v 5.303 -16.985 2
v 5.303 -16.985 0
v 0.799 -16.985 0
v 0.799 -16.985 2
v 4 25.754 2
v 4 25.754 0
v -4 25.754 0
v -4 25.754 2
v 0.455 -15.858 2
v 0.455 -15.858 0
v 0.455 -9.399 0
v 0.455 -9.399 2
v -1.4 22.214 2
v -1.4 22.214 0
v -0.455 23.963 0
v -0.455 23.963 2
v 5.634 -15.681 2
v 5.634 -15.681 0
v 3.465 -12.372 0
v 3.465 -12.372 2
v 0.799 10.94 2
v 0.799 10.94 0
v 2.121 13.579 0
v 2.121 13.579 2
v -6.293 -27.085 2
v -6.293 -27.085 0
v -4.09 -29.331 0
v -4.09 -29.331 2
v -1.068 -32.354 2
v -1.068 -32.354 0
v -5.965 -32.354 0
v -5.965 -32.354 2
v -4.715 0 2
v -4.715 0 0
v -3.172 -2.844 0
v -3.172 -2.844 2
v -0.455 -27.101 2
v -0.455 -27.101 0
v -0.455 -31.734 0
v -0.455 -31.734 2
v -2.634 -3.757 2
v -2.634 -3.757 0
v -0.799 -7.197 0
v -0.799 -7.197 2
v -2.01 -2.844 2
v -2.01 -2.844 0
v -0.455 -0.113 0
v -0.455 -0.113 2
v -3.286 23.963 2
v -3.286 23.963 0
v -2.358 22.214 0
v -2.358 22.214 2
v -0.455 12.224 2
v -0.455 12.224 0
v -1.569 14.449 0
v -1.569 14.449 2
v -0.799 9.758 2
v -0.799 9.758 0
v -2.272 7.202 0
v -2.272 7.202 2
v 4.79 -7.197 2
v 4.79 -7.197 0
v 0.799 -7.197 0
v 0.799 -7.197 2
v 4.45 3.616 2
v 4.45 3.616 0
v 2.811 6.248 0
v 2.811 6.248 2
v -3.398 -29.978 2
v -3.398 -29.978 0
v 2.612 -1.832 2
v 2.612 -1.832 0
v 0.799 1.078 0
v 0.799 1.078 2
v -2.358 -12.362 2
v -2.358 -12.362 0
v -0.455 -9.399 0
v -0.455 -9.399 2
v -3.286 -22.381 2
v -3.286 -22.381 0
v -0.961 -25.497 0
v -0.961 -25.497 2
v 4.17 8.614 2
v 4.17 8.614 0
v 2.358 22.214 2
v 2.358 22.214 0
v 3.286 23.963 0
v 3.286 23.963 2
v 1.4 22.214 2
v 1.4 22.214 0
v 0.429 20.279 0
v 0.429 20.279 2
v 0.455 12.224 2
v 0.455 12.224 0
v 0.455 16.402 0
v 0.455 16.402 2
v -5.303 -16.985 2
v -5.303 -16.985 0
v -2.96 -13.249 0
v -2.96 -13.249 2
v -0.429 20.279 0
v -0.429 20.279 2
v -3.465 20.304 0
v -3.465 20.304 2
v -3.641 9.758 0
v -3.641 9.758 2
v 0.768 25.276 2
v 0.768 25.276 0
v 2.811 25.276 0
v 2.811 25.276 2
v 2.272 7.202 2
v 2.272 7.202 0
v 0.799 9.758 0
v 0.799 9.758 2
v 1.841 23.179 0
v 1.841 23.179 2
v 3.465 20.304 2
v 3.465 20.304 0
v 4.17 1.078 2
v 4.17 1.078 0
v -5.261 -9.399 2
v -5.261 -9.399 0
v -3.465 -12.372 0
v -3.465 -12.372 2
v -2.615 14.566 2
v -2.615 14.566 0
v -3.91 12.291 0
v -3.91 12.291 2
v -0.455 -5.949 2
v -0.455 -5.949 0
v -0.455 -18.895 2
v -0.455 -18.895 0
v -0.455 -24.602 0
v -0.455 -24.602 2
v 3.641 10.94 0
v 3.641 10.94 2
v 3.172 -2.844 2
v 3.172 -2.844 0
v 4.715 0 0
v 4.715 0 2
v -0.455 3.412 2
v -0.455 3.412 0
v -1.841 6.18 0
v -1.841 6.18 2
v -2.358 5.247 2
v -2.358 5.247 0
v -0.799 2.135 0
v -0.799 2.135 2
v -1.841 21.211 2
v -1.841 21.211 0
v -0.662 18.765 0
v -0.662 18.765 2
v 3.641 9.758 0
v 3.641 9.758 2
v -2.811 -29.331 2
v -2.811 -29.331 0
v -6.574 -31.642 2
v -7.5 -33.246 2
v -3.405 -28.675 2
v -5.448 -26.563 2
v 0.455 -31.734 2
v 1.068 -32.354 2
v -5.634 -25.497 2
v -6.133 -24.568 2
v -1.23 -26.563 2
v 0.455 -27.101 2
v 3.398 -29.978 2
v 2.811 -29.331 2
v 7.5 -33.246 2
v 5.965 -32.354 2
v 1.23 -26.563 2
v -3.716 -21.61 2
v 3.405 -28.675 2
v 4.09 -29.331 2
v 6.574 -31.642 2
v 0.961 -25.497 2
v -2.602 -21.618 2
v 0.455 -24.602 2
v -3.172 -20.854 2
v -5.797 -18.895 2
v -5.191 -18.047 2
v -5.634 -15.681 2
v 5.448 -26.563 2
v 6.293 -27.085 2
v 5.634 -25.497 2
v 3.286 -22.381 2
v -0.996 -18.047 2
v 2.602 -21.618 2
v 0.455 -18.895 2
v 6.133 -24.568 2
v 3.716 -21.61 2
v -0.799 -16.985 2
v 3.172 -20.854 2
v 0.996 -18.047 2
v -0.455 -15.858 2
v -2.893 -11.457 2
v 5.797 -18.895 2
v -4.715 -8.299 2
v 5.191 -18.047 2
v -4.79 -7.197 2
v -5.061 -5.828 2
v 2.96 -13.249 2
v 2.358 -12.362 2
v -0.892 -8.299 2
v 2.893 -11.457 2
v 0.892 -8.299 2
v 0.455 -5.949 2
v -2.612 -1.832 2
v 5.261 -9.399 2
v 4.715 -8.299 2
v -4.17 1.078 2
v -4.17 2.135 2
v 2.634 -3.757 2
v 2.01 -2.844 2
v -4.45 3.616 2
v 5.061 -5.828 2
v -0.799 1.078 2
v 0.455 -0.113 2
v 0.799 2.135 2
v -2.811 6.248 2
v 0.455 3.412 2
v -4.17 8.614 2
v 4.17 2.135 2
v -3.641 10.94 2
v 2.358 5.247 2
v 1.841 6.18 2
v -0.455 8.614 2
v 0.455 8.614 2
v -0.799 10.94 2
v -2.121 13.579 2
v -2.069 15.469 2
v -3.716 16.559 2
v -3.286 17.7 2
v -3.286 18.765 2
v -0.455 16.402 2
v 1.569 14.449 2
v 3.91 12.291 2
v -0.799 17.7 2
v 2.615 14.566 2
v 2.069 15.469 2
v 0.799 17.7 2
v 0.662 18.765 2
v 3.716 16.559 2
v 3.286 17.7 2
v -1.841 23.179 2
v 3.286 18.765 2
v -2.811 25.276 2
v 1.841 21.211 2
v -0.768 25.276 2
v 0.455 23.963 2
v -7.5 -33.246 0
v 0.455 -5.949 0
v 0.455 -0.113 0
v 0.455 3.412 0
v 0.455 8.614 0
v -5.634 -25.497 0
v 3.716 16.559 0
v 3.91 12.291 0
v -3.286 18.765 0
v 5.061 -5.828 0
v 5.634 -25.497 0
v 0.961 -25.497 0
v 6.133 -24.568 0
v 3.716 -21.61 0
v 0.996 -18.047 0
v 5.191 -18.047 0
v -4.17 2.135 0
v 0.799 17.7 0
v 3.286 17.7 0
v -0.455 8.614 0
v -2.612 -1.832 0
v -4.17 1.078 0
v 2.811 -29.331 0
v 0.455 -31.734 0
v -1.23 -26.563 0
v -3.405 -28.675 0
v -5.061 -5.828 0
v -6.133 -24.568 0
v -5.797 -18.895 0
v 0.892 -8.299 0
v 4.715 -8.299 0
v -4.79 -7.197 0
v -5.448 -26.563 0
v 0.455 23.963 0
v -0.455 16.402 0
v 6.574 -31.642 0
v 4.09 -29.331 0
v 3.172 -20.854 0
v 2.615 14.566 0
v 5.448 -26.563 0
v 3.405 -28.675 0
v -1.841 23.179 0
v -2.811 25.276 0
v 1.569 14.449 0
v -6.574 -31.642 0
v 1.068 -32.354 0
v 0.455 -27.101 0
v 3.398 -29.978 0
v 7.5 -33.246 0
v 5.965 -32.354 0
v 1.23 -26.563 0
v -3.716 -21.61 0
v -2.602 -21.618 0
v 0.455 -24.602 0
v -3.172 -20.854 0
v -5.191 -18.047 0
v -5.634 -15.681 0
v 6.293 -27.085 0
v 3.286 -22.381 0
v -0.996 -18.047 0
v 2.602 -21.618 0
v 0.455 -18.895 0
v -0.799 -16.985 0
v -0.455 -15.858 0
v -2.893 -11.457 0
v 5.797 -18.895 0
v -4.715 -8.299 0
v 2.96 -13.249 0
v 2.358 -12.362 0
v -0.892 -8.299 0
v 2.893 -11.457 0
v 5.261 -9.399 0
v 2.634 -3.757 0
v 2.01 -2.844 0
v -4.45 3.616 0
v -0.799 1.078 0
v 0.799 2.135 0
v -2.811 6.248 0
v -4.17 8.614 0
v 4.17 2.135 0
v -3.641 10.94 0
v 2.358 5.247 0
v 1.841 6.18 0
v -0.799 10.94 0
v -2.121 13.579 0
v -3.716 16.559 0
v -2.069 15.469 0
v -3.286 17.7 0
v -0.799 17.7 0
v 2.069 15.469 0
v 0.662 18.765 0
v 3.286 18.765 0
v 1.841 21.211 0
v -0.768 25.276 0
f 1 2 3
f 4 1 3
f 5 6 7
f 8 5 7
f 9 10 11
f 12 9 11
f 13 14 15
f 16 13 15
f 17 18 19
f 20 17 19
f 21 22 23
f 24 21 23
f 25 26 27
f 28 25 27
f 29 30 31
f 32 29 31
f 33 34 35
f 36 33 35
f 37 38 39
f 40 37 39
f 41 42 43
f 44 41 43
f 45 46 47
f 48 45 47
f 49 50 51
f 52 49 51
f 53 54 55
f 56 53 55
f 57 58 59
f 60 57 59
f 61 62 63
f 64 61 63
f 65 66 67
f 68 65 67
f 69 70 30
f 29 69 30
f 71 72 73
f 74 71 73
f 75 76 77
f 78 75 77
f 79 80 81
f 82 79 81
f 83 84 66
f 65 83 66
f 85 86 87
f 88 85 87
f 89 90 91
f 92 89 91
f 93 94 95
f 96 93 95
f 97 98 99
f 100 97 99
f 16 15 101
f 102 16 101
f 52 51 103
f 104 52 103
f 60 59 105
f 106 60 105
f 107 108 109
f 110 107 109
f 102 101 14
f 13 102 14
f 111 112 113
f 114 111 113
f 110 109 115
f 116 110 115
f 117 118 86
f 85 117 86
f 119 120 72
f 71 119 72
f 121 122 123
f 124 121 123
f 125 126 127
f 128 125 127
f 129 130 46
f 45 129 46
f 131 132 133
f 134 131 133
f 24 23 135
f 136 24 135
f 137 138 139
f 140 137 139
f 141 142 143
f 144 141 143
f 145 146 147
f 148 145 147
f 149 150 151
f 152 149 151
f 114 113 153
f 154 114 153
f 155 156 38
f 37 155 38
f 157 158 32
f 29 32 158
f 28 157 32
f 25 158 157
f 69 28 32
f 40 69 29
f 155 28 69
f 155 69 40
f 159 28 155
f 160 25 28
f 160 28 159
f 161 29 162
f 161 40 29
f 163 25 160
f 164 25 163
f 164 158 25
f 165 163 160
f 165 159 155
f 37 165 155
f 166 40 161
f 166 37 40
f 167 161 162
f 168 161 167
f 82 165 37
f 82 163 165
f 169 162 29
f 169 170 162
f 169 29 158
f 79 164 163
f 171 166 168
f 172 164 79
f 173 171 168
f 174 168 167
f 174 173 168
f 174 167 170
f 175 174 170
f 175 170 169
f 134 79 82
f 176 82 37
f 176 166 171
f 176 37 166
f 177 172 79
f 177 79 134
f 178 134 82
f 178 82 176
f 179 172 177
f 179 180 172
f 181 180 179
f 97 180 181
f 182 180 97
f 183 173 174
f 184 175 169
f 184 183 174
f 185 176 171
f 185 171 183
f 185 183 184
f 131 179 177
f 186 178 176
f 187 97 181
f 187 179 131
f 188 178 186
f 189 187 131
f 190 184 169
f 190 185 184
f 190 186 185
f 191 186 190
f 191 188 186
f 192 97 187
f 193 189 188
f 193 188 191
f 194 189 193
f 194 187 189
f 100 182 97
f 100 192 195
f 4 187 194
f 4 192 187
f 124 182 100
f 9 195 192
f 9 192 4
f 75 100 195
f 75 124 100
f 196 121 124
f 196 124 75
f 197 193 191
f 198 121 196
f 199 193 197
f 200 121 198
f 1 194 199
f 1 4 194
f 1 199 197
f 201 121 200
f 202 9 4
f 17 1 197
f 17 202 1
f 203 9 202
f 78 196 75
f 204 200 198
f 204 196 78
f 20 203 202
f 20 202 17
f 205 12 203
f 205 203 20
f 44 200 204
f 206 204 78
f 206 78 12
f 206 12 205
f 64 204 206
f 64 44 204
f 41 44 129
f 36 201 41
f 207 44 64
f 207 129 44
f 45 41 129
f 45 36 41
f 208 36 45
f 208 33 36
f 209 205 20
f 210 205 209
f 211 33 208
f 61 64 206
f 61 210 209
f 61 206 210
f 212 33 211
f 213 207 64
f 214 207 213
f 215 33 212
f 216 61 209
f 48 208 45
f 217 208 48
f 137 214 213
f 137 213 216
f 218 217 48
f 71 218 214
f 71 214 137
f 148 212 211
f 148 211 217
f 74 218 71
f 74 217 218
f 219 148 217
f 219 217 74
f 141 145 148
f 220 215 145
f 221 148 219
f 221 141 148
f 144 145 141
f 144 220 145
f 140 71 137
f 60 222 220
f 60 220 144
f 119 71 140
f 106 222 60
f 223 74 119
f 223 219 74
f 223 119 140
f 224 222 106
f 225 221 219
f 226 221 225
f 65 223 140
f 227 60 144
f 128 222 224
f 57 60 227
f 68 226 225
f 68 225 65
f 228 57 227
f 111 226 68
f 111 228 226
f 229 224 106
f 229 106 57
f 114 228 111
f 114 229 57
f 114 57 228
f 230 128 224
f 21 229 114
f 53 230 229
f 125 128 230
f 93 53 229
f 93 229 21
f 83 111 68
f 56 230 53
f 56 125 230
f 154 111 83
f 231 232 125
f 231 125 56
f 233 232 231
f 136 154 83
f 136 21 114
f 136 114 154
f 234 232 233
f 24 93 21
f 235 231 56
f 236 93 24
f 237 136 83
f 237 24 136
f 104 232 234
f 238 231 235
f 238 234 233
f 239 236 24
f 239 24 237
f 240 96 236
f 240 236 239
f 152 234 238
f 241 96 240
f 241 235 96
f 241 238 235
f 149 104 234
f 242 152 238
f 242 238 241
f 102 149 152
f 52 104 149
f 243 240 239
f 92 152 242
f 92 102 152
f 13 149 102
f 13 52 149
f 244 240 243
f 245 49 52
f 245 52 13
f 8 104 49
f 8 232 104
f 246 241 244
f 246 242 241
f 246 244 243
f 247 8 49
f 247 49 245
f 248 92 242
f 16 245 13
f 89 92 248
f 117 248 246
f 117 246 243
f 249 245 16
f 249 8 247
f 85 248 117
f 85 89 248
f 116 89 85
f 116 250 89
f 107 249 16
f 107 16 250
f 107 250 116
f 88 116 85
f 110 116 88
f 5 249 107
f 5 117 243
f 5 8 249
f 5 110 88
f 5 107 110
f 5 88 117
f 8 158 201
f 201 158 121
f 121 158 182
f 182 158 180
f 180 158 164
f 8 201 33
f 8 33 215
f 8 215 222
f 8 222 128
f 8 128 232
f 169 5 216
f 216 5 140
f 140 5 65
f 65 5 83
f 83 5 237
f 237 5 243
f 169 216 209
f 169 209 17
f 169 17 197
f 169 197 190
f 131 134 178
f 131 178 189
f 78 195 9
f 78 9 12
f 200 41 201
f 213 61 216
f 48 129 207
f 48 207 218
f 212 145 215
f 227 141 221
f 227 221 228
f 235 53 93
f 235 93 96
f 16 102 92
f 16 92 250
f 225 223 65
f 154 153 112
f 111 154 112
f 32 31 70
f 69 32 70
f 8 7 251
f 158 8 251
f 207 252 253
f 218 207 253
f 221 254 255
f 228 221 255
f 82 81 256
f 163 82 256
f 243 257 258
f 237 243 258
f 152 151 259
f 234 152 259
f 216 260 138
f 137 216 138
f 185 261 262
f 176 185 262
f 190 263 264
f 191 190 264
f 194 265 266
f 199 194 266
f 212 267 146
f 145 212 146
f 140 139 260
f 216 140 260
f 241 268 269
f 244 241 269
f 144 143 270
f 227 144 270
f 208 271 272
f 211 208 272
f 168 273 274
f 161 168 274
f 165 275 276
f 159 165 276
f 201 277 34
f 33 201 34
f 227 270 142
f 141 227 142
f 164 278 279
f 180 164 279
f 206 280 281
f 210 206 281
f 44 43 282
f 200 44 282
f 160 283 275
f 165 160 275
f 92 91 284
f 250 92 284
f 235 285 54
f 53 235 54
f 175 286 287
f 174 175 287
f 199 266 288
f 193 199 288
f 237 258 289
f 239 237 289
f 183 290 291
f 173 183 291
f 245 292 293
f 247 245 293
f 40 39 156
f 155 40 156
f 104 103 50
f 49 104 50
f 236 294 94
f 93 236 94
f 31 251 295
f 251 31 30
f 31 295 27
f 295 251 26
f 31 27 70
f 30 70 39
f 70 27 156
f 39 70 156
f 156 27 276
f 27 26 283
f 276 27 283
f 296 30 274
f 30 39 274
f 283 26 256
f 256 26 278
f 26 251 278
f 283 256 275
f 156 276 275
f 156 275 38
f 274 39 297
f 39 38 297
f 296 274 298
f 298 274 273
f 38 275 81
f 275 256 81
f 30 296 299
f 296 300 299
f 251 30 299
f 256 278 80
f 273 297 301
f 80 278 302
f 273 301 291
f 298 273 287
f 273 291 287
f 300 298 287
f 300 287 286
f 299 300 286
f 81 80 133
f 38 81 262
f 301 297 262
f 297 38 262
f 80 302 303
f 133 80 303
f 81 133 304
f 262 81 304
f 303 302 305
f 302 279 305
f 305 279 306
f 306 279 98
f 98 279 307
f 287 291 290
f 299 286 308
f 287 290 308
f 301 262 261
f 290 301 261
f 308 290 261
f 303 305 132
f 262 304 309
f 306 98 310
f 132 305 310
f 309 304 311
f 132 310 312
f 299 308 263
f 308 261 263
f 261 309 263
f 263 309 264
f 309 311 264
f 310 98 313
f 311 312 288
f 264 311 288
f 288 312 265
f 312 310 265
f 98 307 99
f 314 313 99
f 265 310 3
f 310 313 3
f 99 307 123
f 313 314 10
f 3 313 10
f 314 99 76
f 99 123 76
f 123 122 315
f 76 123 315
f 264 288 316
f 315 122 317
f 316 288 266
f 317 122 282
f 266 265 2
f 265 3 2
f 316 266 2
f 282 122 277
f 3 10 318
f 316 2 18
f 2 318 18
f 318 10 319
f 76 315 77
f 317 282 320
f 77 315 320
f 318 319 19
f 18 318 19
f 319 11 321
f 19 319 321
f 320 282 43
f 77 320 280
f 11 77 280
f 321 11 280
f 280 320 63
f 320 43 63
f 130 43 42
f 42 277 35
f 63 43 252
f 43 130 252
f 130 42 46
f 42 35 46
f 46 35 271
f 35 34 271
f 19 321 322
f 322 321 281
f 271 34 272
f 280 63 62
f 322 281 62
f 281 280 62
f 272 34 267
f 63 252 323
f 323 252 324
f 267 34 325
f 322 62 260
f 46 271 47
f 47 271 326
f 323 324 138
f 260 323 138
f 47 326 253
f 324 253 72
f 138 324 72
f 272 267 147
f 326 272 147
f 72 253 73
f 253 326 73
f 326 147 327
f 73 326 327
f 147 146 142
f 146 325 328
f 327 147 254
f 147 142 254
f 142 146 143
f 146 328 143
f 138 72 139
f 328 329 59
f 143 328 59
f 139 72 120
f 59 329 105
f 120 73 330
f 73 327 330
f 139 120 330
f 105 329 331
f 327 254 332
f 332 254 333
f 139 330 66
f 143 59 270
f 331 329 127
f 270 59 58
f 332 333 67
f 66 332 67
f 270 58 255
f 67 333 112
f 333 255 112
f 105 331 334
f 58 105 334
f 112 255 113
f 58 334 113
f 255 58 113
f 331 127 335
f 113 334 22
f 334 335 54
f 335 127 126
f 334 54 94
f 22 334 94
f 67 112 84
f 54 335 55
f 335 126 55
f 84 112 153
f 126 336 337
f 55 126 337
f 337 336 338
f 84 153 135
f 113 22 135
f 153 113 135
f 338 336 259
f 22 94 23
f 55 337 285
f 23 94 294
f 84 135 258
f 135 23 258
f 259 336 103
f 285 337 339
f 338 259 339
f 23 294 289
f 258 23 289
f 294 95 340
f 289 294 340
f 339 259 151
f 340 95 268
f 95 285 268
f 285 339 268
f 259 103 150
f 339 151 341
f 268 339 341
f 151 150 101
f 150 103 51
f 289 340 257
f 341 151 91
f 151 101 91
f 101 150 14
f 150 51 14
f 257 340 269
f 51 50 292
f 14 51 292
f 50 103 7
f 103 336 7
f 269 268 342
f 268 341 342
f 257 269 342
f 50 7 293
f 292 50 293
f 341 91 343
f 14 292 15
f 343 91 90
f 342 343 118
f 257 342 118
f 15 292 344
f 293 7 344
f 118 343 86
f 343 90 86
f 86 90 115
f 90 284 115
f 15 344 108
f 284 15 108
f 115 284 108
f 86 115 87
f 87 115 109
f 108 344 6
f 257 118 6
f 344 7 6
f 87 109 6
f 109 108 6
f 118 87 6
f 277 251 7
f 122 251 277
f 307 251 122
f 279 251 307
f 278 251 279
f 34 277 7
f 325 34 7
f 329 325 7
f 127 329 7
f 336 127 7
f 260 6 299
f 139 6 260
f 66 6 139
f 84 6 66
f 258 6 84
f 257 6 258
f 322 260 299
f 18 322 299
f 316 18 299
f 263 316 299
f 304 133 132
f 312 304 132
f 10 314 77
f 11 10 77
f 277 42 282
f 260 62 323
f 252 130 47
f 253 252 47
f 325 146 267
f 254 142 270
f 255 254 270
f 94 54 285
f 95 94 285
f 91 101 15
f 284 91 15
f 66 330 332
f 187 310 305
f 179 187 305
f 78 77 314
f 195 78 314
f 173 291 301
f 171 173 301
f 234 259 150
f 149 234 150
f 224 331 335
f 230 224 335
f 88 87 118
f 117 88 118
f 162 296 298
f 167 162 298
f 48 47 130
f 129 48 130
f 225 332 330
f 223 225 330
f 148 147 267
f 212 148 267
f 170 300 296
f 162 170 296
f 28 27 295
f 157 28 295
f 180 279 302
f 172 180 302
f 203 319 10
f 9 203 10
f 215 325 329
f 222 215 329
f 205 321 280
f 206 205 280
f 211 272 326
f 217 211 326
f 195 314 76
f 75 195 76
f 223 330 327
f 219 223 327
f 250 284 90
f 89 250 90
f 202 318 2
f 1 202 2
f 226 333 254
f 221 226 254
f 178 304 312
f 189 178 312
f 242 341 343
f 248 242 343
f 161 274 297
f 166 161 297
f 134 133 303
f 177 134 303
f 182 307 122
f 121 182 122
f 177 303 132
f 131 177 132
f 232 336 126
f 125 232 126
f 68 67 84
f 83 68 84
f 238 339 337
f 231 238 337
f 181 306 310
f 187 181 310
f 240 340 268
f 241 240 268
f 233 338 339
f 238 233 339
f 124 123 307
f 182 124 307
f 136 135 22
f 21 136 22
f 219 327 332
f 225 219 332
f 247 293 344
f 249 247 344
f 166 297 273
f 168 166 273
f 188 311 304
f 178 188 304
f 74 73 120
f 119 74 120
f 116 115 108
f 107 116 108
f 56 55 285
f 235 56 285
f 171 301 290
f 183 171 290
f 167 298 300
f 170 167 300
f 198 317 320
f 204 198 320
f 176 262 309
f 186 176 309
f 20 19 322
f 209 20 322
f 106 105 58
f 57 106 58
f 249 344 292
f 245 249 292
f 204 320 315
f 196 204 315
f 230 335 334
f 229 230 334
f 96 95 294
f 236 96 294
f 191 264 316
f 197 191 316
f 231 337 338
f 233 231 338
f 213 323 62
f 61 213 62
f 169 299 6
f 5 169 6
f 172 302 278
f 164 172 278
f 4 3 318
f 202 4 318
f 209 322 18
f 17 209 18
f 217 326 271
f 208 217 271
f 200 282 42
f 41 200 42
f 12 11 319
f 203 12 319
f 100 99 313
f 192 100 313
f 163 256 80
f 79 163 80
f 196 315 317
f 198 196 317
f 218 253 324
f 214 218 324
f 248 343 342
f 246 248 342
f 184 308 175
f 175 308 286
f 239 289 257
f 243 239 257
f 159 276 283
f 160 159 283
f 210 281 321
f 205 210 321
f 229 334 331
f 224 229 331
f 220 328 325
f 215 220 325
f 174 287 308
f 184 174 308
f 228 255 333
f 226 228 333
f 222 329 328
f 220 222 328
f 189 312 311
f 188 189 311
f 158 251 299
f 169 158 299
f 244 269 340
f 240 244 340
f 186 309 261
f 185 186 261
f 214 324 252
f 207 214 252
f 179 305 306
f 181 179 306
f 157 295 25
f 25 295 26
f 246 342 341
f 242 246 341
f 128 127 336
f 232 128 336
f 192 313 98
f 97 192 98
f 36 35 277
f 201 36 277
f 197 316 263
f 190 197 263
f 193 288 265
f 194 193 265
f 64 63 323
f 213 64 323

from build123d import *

# Parameters (mm, degrees)
F1_DEPTH = 2


with BuildPart() as f1:
    # F0 (on Top) → F1 (new body)
    with BuildSketch(Plane.XY):
        Polygon((4, 25.754048), (0, 25.754048), (-4, 25.754048), (-7.5, -33.245952), (0, -33.245952), (7.5, -33.245952), align=None)
        Polygon((-4.089832, -29.330796), (-6.573987, -31.641873), (-6.292557, -27.084958), align=None, mode=Mode.SUBTRACT)
        Polygon((-6.13311, -24.568204), (-5.796553, -18.894804), (-3.715754, -21.609863), align=None, mode=Mode.SUBTRACT)
        Polygon((-1.067552, -32.354102), (-5.965223, -32.354102), (-3.397664, -29.978383), align=None, mode=Mode.SUBTRACT)
        Polygon((-3.404538, -28.675417), (-5.447618, -26.563399), (-1.229849, -26.563399), align=None, mode=Mode.SUBTRACT)
        Polygon((-0.45485, -31.733501), (-2.811431, -29.330796), (-0.45485, -27.101166), align=None, mode=Mode.SUBTRACT)
        Polygon((-5.633629, -25.496741), (-3.286195, -22.381087), (-0.96125, -25.496741), align=None, mode=Mode.SUBTRACT)
        Polygon((-3.17182, -20.85387), (-5.191417, -18.046699), (-0.996083, -18.046699), align=None, mode=Mode.SUBTRACT)
        Polygon((-2.601866, -21.61763), (-0.45485, -18.894804), (-0.45485, -24.601909), align=None, mode=Mode.SUBTRACT)
        Polygon((-3.465, -12.372064), (-5.633629, -15.68081), (-5.260959, -9.398653), align=None, mode=Mode.SUBTRACT)
        Polygon((-0.799204, -16.985185), (-5.30343, -16.985185), (-2.959617, -13.249483), align=None, mode=Mode.SUBTRACT)
        Polygon((-2.357842, -12.361948), (-0.45485, -9.398653), (-0.45485, -15.858355), align=None, mode=Mode.SUBTRACT)
        Polygon((-2.892819, -11.457191), (-4.714794, -8.298798), (-0.8917, -8.298798), align=None, mode=Mode.SUBTRACT)
        Polygon((-0.799204, -7.197334), (-4.789895, -7.197334), (-2.633869, -3.756868), align=None, mode=Mode.SUBTRACT)
        Polygon((2.811431, -29.330796), (0.45485, -31.733501), (0.45485, -27.101166), align=None, mode=Mode.SUBTRACT)
        Polygon((5.965223, -32.354102), (1.067552, -32.354102), (3.397664, -29.978383), align=None, mode=Mode.SUBTRACT)
        Polygon((5.447618, -26.563399), (3.404538, -28.675417), (1.229849, -26.563399), align=None, mode=Mode.SUBTRACT)
        Polygon((0.45485, -18.894804), (2.601866, -21.61763), (0.45485, -24.601909), align=None, mode=Mode.SUBTRACT)
        Polygon((3.286195, -22.381087), (5.633629, -25.496741), (0.96125, -25.496741), align=None, mode=Mode.SUBTRACT)
        Polygon((0.996083, -18.046699), (5.191417, -18.046699), (3.17182, -20.85387), align=None, mode=Mode.SUBTRACT)
        Polygon((6.292557, -27.084958), (6.573987, -31.641873), (4.089832, -29.330796), align=None, mode=Mode.SUBTRACT)
        Polygon((5.796553, -18.894804), (6.13311, -24.568204), (3.715754, -21.609863), align=None, mode=Mode.SUBTRACT)
        Polygon((2.357842, -12.361948), (0.45485, -15.858355), (0.45485, -9.398653), align=None, mode=Mode.SUBTRACT)
        Polygon((0.799204, -16.985185), (2.959617, -13.249483), (5.30343, -16.985185), align=None, mode=Mode.SUBTRACT)
        Polygon((0.8917, -8.298798), (4.714794, -8.298798), (2.892819, -11.457191), align=None, mode=Mode.SUBTRACT)
        Polygon((4.789895, -7.197334), (0.799204, -7.197334), (2.633869, -3.756868), align=None, mode=Mode.SUBTRACT)
        Polygon((3.465, -12.372064), (5.260959, -9.398653), (5.633629, -15.68081), align=None, mode=Mode.SUBTRACT)
        Polygon((-5.060531, -5.828136), (-4.714794, 0), (-3.17182, -2.843706), align=None, mode=Mode.SUBTRACT)
        Polygon((-2.611527, -1.832106), (-4.170251, 1.077535), (-0.799204, 1.077535), align=None, mode=Mode.SUBTRACT)
        Polygon((-2.009785, -2.843706), (-0.45485, -0.113241), (-0.45485, -5.948542), align=None, mode=Mode.SUBTRACT)
        Polygon((-4.450015, 3.616143), (-4.170251, 8.613745), (-2.811431, 6.248467), align=None, mode=Mode.SUBTRACT)
        Polygon((-0.799204, 2.134794), (-4.170251, 2.134794), (-2.357842, 5.247023), align=None, mode=Mode.SUBTRACT)
        Polygon((-2.271924, 7.201679), (-3.641225, 9.758234), (-0.799204, 9.758234), align=None, mode=Mode.SUBTRACT)
        Polygon((-1.841009, 6.179651), (-0.45485, 8.613745), (-0.45485, 3.411822), align=None, mode=Mode.SUBTRACT)
        Polygon((-3.910219, 12.291129), (-3.715754, 16.559127), (-2.614767, 14.565943), align=None, mode=Mode.SUBTRACT)
        Polygon((-0.799204, 10.940004), (-3.641225, 10.940004), (-2.120922, 13.579161), align=None, mode=Mode.SUBTRACT)
        Polygon((-2.069376, 15.469204), (-3.286195, 17.699626), (-0.799204, 17.699626), align=None, mode=Mode.SUBTRACT)
        Polygon((-0.45485, 12.224307), (-1.568874, 14.448747), (-0.45485, 16.402385), align=None, mode=Mode.SUBTRACT)
        Polygon((-0.661599, 18.764926), (-3.286195, 18.764926), (-1.841009, 21.210955), align=None, mode=Mode.SUBTRACT)
        Polygon((-3.465, 20.303925), (-3.286195, 23.963032), (-2.357842, 22.213539), align=None, mode=Mode.SUBTRACT)
        Polygon((-1.841009, 23.178602), (-2.811431, 25.27616), (-0.76812, 25.27616), align=None, mode=Mode.SUBTRACT)
        Polygon((-1.39996, 22.213539), (-0.45485, 23.963032), (-0.429307, 20.278619), align=None, mode=Mode.SUBTRACT)
        Polygon((0.45485, -5.948542), (0.45485, -0.113241), (2.009785, -2.843706), align=None, mode=Mode.SUBTRACT)
        Polygon((0.799204, 1.077535), (4.170251, 1.077535), (2.611527, -1.832106), align=None, mode=Mode.SUBTRACT)
        Polygon((0.45485, 8.613745), (1.841009, 6.179651), (0.45485, 3.411822), align=None, mode=Mode.SUBTRACT)
        Polygon((0.799204, 2.134794), (2.357842, 5.247023), (4.170251, 2.134794), align=None, mode=Mode.SUBTRACT)
        Polygon((2.811431, 6.248467), (4.170251, 8.613745), (4.450015, 3.616143), align=None, mode=Mode.SUBTRACT)
        Polygon((2.271924, 7.201679), (0.799204, 9.758234), (3.641225, 9.758234), align=None, mode=Mode.SUBTRACT)
        Polygon((4.714794, 0), (5.060531, -5.828136), (3.17182, -2.843706), align=None, mode=Mode.SUBTRACT)
        Polygon((1.568874, 14.448747), (0.45485, 12.224307), (0.45485, 16.402385), align=None, mode=Mode.SUBTRACT)
        Polygon((0.799204, 10.940004), (2.120922, 13.579161), (3.641225, 10.940004), align=None, mode=Mode.SUBTRACT)
        Polygon((3.910219, 12.291129), (2.614767, 14.565943), (3.715754, 16.559127), align=None, mode=Mode.SUBTRACT)
        Polygon((0.799204, 17.699626), (3.286195, 17.699626), (2.069376, 15.469204), align=None, mode=Mode.SUBTRACT)
        Polygon((0.45485, 23.963032), (1.39996, 22.213539), (0.429307, 20.278619), align=None, mode=Mode.SUBTRACT)
        Polygon((0.76812, 25.27616), (2.811431, 25.27616), (1.841009, 23.178602), align=None, mode=Mode.SUBTRACT)
        Polygon((0.661599, 18.764926), (1.841009, 21.210955), (3.286195, 18.764926), align=None, mode=Mode.SUBTRACT)
        Polygon((3.465, 20.303925), (2.357842, 22.213539), (3.286195, 23.963032), align=None, mode=Mode.SUBTRACT)
    extrude(amount=F1_DEPTH)


solid = f1.part
